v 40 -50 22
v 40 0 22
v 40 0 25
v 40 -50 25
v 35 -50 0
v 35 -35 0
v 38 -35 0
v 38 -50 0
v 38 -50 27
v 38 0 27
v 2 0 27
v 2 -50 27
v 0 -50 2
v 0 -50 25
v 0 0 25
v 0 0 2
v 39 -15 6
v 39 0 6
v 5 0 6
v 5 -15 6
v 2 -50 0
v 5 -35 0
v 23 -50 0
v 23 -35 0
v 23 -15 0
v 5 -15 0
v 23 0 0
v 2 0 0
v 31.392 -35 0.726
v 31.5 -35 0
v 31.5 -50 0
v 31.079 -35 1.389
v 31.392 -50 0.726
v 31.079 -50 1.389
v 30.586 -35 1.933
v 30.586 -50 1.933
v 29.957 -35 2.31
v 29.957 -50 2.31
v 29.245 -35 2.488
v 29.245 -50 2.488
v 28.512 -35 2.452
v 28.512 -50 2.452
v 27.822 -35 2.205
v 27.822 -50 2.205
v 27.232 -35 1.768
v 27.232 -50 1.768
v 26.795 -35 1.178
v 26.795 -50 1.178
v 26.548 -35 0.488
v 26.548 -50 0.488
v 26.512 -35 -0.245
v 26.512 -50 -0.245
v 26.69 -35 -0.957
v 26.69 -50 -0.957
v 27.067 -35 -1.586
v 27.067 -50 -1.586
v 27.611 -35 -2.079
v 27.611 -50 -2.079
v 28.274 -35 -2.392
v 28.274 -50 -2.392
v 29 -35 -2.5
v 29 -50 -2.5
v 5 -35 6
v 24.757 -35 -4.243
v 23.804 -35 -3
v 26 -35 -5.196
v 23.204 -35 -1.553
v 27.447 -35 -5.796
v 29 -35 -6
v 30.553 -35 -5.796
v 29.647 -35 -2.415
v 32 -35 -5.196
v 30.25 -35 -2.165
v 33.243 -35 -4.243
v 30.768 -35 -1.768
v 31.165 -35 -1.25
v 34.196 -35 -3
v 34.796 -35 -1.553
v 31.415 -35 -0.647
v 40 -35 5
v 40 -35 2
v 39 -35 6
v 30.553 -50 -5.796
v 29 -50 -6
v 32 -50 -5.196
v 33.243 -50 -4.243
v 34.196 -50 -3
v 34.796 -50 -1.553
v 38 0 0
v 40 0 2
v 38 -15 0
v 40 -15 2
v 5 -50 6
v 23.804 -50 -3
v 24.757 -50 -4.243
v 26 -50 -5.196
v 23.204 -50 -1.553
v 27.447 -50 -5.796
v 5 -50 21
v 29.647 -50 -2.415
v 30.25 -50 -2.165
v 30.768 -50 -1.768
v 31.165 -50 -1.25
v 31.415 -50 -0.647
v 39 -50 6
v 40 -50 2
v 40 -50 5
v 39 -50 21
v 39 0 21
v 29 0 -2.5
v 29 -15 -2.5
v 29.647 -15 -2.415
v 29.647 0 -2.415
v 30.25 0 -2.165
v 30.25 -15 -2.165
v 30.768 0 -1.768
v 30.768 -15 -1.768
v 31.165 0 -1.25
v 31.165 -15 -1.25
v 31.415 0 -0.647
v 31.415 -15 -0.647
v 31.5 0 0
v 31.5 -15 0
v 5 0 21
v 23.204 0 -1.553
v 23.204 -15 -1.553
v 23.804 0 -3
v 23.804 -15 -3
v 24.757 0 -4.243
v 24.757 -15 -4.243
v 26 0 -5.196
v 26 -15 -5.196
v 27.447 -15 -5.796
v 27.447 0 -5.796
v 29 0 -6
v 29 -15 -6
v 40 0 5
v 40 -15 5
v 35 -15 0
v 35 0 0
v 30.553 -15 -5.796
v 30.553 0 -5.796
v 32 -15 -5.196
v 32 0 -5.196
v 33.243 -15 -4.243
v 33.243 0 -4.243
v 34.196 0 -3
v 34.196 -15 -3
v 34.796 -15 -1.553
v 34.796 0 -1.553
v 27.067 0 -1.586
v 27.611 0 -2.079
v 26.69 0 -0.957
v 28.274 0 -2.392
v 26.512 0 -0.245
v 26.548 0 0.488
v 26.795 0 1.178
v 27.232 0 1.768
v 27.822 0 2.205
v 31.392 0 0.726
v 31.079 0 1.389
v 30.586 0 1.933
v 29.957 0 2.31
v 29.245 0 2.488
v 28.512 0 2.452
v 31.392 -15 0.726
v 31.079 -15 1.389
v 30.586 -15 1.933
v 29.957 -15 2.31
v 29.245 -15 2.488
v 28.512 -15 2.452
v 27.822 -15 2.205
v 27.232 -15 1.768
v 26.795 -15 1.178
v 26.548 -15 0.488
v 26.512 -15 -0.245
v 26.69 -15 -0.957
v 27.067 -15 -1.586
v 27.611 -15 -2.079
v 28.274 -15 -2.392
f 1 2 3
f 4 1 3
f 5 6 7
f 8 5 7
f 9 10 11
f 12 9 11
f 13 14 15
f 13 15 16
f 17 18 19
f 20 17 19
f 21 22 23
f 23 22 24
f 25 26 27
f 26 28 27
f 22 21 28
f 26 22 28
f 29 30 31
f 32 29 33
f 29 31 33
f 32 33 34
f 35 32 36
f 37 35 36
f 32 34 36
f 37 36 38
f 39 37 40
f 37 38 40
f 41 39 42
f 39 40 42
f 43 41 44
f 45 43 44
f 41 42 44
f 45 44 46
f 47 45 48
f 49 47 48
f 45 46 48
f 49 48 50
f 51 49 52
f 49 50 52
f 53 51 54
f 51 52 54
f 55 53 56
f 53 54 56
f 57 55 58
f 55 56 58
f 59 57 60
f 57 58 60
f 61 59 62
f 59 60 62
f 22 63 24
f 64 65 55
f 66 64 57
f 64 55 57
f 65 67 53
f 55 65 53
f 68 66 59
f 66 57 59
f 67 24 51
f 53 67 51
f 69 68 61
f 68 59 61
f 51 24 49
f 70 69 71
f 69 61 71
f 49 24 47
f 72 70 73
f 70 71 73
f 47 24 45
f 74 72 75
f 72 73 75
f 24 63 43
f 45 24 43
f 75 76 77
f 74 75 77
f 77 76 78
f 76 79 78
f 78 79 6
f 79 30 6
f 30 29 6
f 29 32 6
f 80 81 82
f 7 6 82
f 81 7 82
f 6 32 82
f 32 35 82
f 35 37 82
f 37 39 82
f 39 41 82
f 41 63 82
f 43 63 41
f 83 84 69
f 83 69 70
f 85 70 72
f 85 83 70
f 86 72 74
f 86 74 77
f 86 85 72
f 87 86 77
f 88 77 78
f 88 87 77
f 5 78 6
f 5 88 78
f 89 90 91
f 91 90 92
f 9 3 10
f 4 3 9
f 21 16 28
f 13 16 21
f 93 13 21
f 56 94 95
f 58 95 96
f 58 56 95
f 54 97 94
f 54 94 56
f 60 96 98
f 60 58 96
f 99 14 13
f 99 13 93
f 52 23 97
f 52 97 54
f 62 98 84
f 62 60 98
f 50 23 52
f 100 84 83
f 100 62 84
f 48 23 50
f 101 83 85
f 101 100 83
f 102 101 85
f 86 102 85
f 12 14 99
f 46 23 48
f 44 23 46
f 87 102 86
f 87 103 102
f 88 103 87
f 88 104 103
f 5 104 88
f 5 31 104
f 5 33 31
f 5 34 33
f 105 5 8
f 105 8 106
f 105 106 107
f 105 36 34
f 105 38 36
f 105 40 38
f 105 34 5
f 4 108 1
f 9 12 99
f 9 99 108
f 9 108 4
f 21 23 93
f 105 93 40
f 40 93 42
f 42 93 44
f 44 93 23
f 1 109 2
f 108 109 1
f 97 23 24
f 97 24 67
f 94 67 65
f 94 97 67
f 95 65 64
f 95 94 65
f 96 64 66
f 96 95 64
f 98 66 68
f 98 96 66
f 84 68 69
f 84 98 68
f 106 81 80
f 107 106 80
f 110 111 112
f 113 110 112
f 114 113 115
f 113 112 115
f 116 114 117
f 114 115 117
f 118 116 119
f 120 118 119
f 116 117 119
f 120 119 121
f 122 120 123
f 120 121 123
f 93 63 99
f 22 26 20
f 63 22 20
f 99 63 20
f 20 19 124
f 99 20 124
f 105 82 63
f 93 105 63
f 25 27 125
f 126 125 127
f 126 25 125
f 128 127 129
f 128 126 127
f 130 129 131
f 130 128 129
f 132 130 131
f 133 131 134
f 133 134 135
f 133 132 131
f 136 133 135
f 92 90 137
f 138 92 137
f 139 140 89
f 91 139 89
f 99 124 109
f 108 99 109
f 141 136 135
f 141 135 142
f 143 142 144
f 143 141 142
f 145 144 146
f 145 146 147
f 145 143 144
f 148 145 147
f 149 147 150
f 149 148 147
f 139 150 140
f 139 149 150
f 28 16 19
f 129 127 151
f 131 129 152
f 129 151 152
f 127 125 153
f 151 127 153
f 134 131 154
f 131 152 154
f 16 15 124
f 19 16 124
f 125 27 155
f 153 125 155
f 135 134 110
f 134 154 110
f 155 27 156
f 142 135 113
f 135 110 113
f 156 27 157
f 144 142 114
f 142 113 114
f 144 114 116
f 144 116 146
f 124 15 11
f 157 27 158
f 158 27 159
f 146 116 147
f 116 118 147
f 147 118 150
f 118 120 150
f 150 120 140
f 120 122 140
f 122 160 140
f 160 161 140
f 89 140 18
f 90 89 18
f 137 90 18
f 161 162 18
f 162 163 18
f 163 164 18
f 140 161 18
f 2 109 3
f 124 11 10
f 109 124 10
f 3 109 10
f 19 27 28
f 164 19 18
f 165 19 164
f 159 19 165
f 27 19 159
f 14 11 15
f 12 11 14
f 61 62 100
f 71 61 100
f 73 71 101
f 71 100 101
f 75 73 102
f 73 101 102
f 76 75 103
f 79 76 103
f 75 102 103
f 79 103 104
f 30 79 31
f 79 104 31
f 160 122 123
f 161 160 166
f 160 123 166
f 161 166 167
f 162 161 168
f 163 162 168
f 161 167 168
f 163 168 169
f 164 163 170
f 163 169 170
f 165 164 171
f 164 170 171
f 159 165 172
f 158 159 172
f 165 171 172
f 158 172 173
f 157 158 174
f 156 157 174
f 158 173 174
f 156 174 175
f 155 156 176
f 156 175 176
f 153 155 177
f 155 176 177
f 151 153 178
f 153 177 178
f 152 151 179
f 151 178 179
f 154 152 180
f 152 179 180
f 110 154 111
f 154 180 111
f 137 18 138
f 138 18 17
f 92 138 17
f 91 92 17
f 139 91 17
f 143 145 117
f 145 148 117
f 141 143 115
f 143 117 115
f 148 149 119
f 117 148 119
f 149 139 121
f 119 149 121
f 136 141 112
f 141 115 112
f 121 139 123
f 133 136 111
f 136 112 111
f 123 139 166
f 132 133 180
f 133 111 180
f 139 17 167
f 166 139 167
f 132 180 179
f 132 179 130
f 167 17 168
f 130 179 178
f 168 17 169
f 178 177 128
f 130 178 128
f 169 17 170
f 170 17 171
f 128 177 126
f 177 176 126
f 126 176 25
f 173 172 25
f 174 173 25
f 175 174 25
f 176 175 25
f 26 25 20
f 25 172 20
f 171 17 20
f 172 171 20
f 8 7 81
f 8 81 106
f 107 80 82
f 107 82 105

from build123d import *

# Parameters (mm, degrees)
F0_W     = 12
F0_H     = 6
F1_DEPTH = 50
F2_R     = 5.99999
F4_DEPTH = 25
F6_DEPTH = 60
F7_SIZE  = 2
F8_SIZE  = 1


# Not quite as in the source:
# - a fillet or chamfer is up to 0.001 mm smaller than in the source, because OpenCascade refuses the exact size


with BuildPart() as f1:
    # F0 (on Front) → F1 (new body)
    with BuildSketch(Plane.XZ):
        Polygon((0, 27), (0, 0), (20, 0), (23, 0), (35, 0), (40, 0), (40, 6), (5, 6), (5, 21), (40, 21), (40, 27), align=None)
        with Locations((29, -3)):
            Rectangle(F0_W, F0_H)
    extrude(amount=F1_DEPTH)

    # F2 (radius 6 in the source; OpenCascade refuses exactly that, so slightly less here)
    f2_edges = [f1.edges().sort_by_distance(p)[0] for p in [
        (23, -25, -6),
        (35, -25, -6),
    ]]
    fillet(f2_edges, radius=F2_R)

    # F3 (on face) → F4 (cut)
    with BuildSketch(Plane.XY.offset(6)):
        Polygon((40, -35), (40, -25), (40, -15), (5, -15), (5, -35), align=None)
    extrude(amount=-F4_DEPTH, mode=Mode.SUBTRACT)

    # F5 (on face) → F6 (cut)
    with BuildSketch(Plane.XZ.offset(50)):
        with BuildLine():
            ThreePointArc((29, -2.5), (30.767766953, -1.767766953), (31.5, 0))
            ThreePointArc((31.5, 0), (27.232233047, 1.767766953), (29, -2.5))
        make_face()
    extrude(amount=-F6_DEPTH, mode=Mode.SUBTRACT)

    # F7
    f7_edges = [f1.edges().sort_by_distance(p)[0] for p in [
        (0, -25, 27),
        (40, -25, 27),
        (0, -25, 0),
        (40, -42.5, 0),
        (40, -7.5, 0),
    ]]
    chamfer(f7_edges, length=F7_SIZE)

    # F8
    f8_edges = [f1.edges().sort_by_distance(p)[0] for p in [
        (40, -42.5, 6),
        (40, -7.5, 6),
        (40, -25, 21),
    ]]
    chamfer(f8_edges, length=F8_SIZE)


solid = f1.part
